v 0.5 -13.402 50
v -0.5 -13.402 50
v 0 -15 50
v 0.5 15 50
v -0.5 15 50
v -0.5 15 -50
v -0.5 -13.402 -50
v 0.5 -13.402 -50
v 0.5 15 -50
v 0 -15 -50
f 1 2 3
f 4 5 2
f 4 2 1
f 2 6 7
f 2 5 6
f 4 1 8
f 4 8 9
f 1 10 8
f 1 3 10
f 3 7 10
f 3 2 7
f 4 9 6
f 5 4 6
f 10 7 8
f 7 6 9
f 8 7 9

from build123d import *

# Parameters (mm, degrees)
SALIENTE_EXTRUIR1_DEPTH = 50


with BuildPart() as part:
    # Croquis1 → Saliente-Extruir1 (new, symmetric)
    with BuildSketch(Plane.XY):
        Polygon((0, -15), (0.5, -13.402366253), (0.5, 15), (-0.5, 15), (-0.5, -13.402366253), align=None)
    extrude(amount=SALIENTE_EXTRUIR1_DEPTH, both=True)


solid = part.part
